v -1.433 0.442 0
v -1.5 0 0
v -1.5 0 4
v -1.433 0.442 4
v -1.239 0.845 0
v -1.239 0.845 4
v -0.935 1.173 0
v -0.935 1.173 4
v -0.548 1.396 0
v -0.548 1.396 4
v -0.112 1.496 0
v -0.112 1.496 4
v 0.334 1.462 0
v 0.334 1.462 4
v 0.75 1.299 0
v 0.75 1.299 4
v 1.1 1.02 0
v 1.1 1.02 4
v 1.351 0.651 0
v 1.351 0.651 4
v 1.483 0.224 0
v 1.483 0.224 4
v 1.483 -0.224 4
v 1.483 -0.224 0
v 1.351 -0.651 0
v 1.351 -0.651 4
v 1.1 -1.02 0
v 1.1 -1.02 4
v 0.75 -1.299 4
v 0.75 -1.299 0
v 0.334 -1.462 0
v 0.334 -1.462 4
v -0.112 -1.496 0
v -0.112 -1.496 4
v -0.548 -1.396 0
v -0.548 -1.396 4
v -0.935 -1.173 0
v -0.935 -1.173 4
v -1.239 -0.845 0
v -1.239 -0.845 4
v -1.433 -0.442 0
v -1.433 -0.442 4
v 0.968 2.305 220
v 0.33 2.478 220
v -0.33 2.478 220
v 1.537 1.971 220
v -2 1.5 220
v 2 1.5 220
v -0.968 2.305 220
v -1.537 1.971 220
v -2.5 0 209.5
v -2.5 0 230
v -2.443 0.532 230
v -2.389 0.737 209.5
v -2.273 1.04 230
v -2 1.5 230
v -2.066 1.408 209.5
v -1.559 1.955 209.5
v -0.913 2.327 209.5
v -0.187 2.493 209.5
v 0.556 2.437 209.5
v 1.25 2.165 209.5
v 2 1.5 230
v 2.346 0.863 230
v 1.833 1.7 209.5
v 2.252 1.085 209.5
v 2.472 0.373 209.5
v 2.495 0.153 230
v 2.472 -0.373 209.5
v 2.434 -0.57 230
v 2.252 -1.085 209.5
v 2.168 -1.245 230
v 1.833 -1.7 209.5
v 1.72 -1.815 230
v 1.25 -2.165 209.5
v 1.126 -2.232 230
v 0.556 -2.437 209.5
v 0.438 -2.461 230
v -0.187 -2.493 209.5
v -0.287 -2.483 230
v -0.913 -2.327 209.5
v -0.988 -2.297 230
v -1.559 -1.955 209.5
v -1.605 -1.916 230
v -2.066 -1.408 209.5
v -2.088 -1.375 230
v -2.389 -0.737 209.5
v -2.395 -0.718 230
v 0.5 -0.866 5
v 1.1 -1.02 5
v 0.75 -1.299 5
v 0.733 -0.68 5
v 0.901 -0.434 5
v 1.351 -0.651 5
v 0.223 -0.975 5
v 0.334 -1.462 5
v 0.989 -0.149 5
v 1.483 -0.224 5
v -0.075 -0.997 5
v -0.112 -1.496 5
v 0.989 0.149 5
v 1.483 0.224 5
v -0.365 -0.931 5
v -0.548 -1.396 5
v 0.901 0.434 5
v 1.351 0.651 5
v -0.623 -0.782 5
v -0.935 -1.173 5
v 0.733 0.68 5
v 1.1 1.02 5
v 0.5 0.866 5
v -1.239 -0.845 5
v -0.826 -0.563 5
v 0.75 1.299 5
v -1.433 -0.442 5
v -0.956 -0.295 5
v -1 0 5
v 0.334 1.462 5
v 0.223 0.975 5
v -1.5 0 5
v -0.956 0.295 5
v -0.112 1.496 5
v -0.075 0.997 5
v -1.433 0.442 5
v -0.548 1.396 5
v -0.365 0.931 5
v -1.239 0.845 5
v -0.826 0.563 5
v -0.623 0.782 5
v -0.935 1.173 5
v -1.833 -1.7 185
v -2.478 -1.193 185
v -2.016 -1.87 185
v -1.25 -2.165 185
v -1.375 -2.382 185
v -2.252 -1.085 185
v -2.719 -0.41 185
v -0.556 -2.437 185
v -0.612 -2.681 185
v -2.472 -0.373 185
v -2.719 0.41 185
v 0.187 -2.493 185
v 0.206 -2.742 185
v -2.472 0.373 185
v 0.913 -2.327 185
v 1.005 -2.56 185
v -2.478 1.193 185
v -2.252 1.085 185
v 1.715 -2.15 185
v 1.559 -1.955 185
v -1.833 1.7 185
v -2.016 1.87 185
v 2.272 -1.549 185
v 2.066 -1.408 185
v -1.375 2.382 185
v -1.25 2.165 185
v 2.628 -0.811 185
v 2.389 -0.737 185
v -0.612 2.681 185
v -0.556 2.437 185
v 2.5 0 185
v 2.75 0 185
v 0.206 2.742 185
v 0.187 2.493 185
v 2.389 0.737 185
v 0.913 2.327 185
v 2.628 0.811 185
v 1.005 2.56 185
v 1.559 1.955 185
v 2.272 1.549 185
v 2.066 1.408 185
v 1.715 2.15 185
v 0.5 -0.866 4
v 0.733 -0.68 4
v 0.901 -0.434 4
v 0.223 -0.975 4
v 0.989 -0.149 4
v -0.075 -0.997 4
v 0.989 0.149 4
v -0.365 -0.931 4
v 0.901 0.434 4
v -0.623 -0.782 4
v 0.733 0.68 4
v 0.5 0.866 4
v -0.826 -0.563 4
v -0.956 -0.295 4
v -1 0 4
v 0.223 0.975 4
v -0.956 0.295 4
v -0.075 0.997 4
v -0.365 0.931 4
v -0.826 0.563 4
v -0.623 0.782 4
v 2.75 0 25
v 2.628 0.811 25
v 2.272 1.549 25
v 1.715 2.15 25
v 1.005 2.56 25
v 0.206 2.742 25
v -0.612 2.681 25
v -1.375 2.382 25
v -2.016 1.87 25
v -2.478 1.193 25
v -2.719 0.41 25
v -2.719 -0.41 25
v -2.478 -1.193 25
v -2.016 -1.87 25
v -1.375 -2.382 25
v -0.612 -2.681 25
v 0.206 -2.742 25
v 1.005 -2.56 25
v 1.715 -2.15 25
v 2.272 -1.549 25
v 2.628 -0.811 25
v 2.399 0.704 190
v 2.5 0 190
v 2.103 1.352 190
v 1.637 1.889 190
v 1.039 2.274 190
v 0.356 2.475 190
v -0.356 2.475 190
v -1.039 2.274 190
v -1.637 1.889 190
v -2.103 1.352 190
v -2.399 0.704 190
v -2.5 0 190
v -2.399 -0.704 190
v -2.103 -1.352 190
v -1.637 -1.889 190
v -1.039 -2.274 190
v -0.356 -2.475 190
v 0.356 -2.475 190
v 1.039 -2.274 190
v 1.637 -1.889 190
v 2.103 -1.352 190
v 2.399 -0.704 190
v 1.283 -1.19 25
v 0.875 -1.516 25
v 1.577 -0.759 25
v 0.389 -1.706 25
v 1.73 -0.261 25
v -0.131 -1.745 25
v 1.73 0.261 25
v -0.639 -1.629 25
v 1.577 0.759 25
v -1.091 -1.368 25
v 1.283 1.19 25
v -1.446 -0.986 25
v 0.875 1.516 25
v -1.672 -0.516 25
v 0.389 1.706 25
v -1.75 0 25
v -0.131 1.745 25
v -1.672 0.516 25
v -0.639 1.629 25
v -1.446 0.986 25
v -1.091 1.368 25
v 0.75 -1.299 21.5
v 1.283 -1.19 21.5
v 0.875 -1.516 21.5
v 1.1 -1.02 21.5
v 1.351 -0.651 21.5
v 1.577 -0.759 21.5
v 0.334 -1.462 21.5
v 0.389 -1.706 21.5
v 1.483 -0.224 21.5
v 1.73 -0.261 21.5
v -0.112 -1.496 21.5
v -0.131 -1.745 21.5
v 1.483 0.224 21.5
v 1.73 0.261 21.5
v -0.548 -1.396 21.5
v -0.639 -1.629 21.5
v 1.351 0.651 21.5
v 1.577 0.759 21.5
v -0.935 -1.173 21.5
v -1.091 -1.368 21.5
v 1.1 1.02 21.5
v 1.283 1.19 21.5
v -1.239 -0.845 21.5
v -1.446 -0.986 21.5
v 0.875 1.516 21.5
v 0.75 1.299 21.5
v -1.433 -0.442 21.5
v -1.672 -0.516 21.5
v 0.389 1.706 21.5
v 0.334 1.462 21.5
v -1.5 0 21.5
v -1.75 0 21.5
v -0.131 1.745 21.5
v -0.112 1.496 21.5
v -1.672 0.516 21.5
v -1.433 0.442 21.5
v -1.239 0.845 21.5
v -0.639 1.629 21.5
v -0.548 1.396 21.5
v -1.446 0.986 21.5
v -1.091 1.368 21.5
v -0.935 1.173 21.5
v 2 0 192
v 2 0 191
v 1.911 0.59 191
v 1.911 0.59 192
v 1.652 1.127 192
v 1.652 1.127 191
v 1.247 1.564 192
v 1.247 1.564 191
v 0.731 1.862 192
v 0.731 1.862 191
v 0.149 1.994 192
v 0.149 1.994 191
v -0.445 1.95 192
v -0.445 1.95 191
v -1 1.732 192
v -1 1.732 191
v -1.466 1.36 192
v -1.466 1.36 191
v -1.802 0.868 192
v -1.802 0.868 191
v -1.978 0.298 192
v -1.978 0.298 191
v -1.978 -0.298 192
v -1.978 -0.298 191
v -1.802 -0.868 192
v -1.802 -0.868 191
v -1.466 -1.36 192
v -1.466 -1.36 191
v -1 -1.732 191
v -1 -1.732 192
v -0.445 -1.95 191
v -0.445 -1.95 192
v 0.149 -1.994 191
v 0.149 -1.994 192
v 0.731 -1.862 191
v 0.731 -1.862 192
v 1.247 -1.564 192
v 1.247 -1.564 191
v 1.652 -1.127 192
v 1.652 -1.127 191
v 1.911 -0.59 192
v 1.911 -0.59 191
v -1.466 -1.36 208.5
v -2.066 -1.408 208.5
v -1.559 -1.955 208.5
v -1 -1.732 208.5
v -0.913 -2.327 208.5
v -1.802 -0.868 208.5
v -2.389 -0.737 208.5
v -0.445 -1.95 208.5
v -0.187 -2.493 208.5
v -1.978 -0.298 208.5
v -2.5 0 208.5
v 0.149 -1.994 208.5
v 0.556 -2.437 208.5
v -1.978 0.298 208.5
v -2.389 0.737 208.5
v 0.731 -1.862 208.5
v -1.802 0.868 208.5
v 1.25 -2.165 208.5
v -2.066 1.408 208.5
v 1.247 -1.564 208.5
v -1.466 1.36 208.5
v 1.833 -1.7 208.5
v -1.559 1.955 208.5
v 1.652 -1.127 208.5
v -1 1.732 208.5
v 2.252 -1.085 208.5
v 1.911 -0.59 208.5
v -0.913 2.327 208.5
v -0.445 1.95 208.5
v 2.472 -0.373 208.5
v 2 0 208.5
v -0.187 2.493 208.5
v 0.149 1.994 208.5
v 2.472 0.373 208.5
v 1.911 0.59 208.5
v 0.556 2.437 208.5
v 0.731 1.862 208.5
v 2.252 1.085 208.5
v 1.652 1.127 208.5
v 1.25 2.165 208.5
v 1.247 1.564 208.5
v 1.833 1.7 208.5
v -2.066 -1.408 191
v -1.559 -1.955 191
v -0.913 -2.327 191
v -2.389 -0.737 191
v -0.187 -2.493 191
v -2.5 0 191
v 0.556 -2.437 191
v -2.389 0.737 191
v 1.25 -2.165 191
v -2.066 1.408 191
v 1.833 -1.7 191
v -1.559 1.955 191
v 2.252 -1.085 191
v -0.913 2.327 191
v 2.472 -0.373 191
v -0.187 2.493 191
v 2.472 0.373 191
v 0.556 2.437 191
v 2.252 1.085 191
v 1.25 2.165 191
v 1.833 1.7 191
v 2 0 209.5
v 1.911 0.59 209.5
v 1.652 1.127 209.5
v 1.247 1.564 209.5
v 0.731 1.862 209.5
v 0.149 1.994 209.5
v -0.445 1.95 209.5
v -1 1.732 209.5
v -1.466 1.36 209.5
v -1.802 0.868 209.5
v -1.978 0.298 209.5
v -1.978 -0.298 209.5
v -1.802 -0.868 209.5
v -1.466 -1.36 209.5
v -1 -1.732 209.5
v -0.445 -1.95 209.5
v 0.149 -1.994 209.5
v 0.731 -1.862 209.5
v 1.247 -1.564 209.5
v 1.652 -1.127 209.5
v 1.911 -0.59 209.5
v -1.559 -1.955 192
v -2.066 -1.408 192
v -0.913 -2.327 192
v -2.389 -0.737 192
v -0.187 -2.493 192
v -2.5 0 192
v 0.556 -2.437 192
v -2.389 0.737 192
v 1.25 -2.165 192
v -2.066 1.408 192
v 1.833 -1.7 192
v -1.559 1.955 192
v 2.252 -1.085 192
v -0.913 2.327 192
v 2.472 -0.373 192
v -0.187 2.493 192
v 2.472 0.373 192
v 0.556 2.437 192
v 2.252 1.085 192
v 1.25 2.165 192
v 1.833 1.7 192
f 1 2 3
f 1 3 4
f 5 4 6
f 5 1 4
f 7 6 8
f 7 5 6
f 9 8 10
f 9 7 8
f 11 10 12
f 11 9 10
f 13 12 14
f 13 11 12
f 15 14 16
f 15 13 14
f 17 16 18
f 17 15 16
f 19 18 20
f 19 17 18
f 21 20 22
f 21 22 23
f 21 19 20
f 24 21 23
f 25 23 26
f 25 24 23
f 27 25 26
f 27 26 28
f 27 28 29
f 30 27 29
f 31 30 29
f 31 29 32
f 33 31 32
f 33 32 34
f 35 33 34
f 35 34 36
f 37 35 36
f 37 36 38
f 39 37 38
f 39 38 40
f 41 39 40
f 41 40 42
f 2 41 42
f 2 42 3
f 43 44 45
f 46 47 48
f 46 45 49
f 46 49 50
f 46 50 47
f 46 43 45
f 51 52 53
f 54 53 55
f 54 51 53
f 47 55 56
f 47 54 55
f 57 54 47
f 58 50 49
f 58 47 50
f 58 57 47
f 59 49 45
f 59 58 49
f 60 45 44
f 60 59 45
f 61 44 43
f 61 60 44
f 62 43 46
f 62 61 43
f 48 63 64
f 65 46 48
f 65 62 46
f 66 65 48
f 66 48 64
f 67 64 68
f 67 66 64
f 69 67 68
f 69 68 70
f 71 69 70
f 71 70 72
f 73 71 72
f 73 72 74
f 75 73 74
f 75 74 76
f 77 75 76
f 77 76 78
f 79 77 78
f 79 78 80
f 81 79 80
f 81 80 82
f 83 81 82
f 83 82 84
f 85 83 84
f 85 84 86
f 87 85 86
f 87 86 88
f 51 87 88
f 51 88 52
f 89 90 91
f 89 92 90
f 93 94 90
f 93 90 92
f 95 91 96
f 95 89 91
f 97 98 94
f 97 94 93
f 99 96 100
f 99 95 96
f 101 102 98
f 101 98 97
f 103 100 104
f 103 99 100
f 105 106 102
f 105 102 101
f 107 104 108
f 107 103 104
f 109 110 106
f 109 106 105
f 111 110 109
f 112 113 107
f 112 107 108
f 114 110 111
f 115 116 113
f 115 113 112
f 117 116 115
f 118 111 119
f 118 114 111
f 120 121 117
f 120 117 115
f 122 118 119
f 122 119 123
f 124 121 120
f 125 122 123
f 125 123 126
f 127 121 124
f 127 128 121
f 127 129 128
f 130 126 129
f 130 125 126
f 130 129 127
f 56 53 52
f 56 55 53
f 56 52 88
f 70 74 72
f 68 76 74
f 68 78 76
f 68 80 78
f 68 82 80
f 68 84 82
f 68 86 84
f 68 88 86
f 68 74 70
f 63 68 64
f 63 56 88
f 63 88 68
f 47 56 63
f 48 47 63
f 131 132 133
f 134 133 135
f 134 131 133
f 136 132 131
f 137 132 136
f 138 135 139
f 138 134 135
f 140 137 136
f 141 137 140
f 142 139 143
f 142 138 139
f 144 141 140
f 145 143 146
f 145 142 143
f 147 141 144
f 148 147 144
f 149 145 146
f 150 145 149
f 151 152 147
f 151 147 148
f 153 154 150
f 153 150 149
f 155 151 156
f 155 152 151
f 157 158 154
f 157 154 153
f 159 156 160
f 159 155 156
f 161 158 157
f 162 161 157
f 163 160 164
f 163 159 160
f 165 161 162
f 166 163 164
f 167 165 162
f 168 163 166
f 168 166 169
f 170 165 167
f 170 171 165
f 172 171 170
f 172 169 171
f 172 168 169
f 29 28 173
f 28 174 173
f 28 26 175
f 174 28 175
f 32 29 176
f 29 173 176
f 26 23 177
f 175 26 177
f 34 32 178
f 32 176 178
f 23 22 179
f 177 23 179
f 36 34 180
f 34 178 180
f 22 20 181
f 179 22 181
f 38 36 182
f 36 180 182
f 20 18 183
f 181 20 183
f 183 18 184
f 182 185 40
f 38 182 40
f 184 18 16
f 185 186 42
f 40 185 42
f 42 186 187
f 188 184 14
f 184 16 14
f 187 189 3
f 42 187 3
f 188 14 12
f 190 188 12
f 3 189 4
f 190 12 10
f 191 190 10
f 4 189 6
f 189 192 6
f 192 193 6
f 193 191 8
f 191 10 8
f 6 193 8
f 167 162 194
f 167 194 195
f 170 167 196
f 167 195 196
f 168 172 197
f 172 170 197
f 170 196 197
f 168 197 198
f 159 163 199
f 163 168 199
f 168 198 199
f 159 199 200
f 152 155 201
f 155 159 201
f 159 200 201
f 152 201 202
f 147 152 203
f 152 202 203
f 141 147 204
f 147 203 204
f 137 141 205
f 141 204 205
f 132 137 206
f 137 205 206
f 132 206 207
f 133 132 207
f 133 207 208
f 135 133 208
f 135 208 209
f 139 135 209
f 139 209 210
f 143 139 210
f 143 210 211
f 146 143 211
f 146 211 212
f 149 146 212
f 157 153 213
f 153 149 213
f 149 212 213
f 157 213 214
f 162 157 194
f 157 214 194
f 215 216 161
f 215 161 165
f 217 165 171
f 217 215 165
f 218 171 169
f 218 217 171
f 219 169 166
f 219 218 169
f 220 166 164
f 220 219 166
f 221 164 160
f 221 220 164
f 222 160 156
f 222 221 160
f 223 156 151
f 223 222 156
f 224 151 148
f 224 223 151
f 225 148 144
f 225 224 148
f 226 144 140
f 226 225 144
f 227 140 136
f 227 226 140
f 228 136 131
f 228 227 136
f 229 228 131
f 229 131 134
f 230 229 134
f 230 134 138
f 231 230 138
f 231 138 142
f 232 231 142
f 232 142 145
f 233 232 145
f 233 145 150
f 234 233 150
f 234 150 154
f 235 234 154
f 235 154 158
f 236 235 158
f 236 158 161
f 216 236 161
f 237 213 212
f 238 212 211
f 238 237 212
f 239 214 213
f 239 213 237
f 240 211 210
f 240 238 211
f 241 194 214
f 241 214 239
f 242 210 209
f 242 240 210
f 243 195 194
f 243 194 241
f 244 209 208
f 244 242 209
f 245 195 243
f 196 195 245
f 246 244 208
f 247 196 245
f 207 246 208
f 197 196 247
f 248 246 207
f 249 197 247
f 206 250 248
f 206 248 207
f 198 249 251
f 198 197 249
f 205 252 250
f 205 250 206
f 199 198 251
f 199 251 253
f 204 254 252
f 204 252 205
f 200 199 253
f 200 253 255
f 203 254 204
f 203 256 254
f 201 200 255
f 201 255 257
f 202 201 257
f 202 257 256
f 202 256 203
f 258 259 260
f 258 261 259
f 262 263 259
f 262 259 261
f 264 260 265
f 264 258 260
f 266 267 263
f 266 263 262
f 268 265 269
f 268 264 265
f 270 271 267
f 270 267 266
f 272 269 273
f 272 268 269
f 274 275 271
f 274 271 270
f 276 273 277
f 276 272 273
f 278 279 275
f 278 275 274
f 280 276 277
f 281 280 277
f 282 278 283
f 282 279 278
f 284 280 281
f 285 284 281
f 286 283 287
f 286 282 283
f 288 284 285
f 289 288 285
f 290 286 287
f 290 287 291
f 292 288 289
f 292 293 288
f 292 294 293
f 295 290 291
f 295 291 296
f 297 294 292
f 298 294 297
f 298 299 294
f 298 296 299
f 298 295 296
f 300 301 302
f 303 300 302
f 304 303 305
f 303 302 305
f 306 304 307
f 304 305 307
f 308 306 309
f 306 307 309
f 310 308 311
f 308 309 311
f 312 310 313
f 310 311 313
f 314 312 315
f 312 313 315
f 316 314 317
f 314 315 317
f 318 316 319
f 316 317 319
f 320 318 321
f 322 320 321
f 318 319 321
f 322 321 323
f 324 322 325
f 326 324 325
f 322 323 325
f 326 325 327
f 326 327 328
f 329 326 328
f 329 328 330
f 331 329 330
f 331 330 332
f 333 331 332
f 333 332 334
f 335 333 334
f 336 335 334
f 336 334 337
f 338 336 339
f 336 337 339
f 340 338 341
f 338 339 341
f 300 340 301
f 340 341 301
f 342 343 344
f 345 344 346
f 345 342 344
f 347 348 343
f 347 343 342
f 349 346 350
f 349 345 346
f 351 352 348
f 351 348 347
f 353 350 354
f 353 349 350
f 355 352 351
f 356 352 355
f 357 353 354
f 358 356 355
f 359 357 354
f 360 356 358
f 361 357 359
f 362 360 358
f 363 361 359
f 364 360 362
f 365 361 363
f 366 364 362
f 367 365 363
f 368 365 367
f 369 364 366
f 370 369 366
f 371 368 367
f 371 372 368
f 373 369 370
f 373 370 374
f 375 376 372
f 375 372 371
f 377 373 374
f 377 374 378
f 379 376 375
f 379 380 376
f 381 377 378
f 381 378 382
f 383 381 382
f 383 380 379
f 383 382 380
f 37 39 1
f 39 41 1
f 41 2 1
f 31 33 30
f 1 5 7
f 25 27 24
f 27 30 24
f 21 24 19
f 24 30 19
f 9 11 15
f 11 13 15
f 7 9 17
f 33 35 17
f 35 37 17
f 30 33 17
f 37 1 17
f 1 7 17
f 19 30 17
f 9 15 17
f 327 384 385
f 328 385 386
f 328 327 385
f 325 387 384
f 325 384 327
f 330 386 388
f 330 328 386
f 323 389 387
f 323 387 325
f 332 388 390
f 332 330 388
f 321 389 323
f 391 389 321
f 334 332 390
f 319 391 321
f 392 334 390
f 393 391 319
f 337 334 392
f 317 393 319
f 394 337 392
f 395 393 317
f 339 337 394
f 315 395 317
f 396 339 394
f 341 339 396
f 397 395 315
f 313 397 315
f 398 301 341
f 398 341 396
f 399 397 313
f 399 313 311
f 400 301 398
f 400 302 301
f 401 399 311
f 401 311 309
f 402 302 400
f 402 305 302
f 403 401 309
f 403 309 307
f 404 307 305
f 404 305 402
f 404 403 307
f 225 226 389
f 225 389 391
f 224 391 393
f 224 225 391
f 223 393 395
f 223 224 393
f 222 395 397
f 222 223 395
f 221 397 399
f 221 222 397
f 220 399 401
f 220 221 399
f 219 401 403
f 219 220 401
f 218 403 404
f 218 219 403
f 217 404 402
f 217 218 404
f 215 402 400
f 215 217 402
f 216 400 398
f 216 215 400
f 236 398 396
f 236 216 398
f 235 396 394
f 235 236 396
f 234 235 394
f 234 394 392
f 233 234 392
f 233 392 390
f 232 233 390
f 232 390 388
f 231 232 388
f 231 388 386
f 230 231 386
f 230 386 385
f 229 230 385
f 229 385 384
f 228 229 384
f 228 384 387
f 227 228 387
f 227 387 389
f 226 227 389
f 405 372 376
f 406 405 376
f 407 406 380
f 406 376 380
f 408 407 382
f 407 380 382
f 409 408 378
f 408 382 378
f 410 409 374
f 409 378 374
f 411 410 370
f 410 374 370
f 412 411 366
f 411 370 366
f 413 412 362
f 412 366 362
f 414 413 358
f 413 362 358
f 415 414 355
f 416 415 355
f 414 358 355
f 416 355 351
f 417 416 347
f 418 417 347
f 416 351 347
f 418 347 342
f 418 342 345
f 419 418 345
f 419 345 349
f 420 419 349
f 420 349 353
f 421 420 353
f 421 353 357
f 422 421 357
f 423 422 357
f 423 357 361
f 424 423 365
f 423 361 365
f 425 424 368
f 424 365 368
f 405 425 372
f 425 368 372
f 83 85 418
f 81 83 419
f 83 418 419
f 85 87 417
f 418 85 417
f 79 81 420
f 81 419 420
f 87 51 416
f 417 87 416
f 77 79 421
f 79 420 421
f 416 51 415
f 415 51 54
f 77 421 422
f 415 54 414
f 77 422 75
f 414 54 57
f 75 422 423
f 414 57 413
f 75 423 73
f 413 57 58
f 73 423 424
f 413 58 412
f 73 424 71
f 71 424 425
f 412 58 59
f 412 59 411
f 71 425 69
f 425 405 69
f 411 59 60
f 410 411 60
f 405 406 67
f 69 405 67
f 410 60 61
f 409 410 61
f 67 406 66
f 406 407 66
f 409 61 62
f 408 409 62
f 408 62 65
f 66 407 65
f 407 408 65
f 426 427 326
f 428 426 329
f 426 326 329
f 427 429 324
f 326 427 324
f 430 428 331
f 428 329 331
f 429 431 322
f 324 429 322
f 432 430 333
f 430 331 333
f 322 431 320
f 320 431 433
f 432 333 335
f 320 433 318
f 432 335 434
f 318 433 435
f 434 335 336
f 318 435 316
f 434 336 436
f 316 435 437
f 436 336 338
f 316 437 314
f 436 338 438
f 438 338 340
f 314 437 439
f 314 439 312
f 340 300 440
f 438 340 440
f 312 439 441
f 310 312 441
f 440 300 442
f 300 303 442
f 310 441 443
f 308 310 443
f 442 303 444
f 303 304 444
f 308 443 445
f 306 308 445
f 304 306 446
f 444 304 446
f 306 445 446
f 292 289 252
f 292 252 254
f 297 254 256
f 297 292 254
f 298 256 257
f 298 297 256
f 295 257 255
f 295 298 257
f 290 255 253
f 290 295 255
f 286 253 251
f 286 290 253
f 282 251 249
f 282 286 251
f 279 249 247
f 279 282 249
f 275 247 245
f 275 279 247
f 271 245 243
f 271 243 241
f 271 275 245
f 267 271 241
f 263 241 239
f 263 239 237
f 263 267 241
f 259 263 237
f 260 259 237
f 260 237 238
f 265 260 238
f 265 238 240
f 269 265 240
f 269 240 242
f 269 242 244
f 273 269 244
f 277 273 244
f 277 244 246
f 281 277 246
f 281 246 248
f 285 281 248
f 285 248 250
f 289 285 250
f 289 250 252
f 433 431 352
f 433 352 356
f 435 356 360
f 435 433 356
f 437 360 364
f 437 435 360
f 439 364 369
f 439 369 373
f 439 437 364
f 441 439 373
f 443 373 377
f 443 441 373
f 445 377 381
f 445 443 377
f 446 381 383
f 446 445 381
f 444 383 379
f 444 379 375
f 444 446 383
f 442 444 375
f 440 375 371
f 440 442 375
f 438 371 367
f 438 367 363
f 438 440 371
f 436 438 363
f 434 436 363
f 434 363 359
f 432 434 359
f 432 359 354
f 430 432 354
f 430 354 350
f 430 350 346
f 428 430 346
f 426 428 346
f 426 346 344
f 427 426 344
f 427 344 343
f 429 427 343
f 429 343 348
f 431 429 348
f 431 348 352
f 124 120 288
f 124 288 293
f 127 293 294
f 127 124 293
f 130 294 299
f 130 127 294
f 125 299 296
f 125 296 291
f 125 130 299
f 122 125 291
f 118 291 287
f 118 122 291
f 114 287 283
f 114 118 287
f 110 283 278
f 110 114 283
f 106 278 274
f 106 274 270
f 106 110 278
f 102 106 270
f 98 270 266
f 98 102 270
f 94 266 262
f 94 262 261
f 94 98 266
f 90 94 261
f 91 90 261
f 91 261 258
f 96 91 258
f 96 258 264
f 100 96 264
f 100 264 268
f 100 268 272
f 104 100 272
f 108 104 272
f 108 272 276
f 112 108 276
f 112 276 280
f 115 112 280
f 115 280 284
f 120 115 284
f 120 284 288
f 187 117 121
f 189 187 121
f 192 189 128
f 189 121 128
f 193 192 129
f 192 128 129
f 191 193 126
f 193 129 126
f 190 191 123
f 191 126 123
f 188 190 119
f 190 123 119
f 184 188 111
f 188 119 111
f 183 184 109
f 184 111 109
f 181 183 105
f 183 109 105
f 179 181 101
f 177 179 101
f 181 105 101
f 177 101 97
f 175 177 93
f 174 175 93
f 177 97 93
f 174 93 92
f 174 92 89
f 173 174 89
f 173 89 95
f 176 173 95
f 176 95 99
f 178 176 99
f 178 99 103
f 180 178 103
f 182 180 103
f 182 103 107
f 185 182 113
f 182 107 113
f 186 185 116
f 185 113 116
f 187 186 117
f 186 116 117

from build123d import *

# Parameters (mm, degrees)
SKETCH_1_R           = 2.75
EXTRUDE_6_DEPTH      = 250
SKETCH_22_R          = 3.543321461
SKETCH_22_R_2        = 1.75
CUT_EXTRUDE_16_DEPTH = 25
SKETCH_23_R          = 4.906655543
SKETCH_23_R_2        = 2.5
CUT_EXTRUDE_17_DEPTH = 61
SKETCH_29_R          = 7.224487221
CUT_EXTRUDE_18_DEPTH = 10
CUT_EXTRUDE_19_DEPTH = 20
SKETCH_33_R          = 3.493195313
SKETCH_33_R_2        = 2.5
CUT_EXTRUDE_20_DEPTH = 5
SKETCH_34_R          = 3.783708721
SKETCH_34_R_2        = 1.5
CUT_EXTRUDE_21_DEPTH = 21.5
SKETCH_36_R          = 3.547380577
SKETCH_36_R_2        = 1
CUT_EXTRUDE_22_DEPTH = 1
SKETCH_37_R          = 5.022204732
SKETCH_37_R_2        = 2
CUT_EXTRUDE_23_DEPTH = 1
SKETCH_38_R          = 5.160137664
SKETCH_38_R_2        = 2
CUT_EXTRUDE_24_DEPTH = 1
SKETCH_39_R          = 4.465898571
CUT_EXTRUDE_25_DEPTH = 10


with BuildPart() as part:
    # 草图1 → 凸台-拉伸6 (new body)
    with BuildSketch(Plane.XY):
        Circle(SKETCH_1_R)
    extrude(amount=EXTRUDE_6_DEPTH)

    # 草图22 → 切除-拉伸16 (cut)
    with BuildSketch(Plane(origin=(0, 0, 0), x_dir=(-1, 0, 0), z_dir=(0, 0, -1))):
        Circle(SKETCH_22_R)
        Circle(SKETCH_22_R_2, mode=Mode.SUBTRACT)
    extrude(amount=-CUT_EXTRUDE_16_DEPTH, mode=Mode.SUBTRACT)

    # 草图23 → 切除-拉伸17 (cut, through all)
    with BuildSketch(Plane(origin=(0, 0, 190), x_dir=(-1, 0, 0), z_dir=(0, 0, -1))):
        Circle(SKETCH_23_R)
        Circle(SKETCH_23_R_2, mode=Mode.SUBTRACT)
    extrude(amount=-CUT_EXTRUDE_17_DEPTH, mode=Mode.SUBTRACT)

    # 草图29 → 切除-拉伸18 (cut)
    with BuildSketch(Plane.XY.offset(250)):
        Circle(SKETCH_29_R)
    extrude(amount=-CUT_EXTRUDE_18_DEPTH, mode=Mode.SUBTRACT)

    # 草图32 → 切除-拉伸19 (cut)
    with BuildSketch(Plane.XY.offset(240)):
        with BuildLine():
            Line((-2, 1.5), (2, 1.5))
            ThreePointArc((2, 1.5), (0, 2.5), (-2, 1.5))
        make_face()
    extrude(amount=-CUT_EXTRUDE_19_DEPTH, mode=Mode.SUBTRACT)

    # 草图33 → 切除-拉伸20 (cut)
    with BuildSketch(Plane.XY.offset(190)):
        Circle(SKETCH_33_R)
        Circle(SKETCH_33_R_2, mode=Mode.SUBTRACT)
    extrude(amount=-CUT_EXTRUDE_20_DEPTH, mode=Mode.SUBTRACT)

    # 草图34 → 切除-拉伸21 (cut)
    with BuildSketch(Plane(origin=(0, 0, 0), x_dir=(-1, 0, 0), z_dir=(0, 0, -1))):
        Circle(SKETCH_34_R)
        Circle(SKETCH_34_R_2, mode=Mode.SUBTRACT)
    extrude(amount=-CUT_EXTRUDE_21_DEPTH, mode=Mode.SUBTRACT)

    # 草图36 → 切除-拉伸22 (cut)
    with BuildSketch(Plane(origin=(0, 0, 5), x_dir=(-1, 0, 0), z_dir=(0, 0, -1))):
        Circle(SKETCH_36_R)
        Circle(SKETCH_36_R_2, mode=Mode.SUBTRACT)
    extrude(amount=CUT_EXTRUDE_22_DEPTH, mode=Mode.SUBTRACT)

    # 草图37 → 切除-拉伸23 (cut)
    with BuildSketch(Plane.XY.offset(191)):
        Circle(SKETCH_37_R)
        Circle(SKETCH_37_R_2, mode=Mode.SUBTRACT)
    extrude(amount=CUT_EXTRUDE_23_DEPTH, mode=Mode.SUBTRACT)

    # 草图38 → 切除-拉伸24 (cut)
    with BuildSketch(Plane.XY.offset(208.5)):
        Circle(SKETCH_38_R)
        Circle(SKETCH_38_R_2, mode=Mode.SUBTRACT)
    extrude(amount=CUT_EXTRUDE_24_DEPTH, mode=Mode.SUBTRACT)

    # 草图39 → 切除-拉伸25 (cut)
    with BuildSketch(Plane.XY.offset(240)):
        Circle(SKETCH_39_R)
    extrude(amount=-CUT_EXTRUDE_25_DEPTH, mode=Mode.SUBTRACT)


solid = part.part
